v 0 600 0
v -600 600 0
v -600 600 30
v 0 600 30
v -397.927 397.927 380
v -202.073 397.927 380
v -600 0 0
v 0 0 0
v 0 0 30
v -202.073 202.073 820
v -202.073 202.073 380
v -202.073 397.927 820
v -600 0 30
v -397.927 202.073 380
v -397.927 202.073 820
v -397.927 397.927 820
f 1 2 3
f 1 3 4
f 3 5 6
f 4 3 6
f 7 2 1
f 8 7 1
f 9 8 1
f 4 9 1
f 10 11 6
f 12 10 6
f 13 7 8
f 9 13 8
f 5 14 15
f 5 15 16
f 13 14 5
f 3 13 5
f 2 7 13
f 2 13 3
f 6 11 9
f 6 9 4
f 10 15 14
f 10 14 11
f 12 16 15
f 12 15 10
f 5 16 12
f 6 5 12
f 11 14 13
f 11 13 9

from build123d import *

# Parameters (mm, degrees)
F0_W     = 600
F0_H     = 600
F1_DEPTH = 380
F2_SIZE2 = 202.0725942164
F2_SIZE  = 350
F3_W     = 195.8548115673
F3_H     = 195.8548115673
F4_DEPTH = 440


with BuildPart() as f1:
    # F0 (on Top) → F1 (new body)
    with BuildSketch(Plane.XY):
        with Locations((-300, 300)):
            Rectangle(F0_W, F0_H)
    extrude(amount=F1_DEPTH)

    # F2
    f2_edges = [f1.edges().sort_by_distance(p)[0] for p in [
        (-300, 0, 380),
        (0, 300, 380),
        (-300, 600, 380),
        (-600, 300, 380),
    ]]
    chamfer(f2_edges, length=F2_SIZE, length2=F2_SIZE2)

    # F3 (on face) → F4 (join)
    with BuildSketch(Plane.XY.offset(380)):
        with Locations((-300, 300)):
            Rectangle(F3_W, F3_H)
    extrude(amount=F4_DEPTH)


solid = f1.part
